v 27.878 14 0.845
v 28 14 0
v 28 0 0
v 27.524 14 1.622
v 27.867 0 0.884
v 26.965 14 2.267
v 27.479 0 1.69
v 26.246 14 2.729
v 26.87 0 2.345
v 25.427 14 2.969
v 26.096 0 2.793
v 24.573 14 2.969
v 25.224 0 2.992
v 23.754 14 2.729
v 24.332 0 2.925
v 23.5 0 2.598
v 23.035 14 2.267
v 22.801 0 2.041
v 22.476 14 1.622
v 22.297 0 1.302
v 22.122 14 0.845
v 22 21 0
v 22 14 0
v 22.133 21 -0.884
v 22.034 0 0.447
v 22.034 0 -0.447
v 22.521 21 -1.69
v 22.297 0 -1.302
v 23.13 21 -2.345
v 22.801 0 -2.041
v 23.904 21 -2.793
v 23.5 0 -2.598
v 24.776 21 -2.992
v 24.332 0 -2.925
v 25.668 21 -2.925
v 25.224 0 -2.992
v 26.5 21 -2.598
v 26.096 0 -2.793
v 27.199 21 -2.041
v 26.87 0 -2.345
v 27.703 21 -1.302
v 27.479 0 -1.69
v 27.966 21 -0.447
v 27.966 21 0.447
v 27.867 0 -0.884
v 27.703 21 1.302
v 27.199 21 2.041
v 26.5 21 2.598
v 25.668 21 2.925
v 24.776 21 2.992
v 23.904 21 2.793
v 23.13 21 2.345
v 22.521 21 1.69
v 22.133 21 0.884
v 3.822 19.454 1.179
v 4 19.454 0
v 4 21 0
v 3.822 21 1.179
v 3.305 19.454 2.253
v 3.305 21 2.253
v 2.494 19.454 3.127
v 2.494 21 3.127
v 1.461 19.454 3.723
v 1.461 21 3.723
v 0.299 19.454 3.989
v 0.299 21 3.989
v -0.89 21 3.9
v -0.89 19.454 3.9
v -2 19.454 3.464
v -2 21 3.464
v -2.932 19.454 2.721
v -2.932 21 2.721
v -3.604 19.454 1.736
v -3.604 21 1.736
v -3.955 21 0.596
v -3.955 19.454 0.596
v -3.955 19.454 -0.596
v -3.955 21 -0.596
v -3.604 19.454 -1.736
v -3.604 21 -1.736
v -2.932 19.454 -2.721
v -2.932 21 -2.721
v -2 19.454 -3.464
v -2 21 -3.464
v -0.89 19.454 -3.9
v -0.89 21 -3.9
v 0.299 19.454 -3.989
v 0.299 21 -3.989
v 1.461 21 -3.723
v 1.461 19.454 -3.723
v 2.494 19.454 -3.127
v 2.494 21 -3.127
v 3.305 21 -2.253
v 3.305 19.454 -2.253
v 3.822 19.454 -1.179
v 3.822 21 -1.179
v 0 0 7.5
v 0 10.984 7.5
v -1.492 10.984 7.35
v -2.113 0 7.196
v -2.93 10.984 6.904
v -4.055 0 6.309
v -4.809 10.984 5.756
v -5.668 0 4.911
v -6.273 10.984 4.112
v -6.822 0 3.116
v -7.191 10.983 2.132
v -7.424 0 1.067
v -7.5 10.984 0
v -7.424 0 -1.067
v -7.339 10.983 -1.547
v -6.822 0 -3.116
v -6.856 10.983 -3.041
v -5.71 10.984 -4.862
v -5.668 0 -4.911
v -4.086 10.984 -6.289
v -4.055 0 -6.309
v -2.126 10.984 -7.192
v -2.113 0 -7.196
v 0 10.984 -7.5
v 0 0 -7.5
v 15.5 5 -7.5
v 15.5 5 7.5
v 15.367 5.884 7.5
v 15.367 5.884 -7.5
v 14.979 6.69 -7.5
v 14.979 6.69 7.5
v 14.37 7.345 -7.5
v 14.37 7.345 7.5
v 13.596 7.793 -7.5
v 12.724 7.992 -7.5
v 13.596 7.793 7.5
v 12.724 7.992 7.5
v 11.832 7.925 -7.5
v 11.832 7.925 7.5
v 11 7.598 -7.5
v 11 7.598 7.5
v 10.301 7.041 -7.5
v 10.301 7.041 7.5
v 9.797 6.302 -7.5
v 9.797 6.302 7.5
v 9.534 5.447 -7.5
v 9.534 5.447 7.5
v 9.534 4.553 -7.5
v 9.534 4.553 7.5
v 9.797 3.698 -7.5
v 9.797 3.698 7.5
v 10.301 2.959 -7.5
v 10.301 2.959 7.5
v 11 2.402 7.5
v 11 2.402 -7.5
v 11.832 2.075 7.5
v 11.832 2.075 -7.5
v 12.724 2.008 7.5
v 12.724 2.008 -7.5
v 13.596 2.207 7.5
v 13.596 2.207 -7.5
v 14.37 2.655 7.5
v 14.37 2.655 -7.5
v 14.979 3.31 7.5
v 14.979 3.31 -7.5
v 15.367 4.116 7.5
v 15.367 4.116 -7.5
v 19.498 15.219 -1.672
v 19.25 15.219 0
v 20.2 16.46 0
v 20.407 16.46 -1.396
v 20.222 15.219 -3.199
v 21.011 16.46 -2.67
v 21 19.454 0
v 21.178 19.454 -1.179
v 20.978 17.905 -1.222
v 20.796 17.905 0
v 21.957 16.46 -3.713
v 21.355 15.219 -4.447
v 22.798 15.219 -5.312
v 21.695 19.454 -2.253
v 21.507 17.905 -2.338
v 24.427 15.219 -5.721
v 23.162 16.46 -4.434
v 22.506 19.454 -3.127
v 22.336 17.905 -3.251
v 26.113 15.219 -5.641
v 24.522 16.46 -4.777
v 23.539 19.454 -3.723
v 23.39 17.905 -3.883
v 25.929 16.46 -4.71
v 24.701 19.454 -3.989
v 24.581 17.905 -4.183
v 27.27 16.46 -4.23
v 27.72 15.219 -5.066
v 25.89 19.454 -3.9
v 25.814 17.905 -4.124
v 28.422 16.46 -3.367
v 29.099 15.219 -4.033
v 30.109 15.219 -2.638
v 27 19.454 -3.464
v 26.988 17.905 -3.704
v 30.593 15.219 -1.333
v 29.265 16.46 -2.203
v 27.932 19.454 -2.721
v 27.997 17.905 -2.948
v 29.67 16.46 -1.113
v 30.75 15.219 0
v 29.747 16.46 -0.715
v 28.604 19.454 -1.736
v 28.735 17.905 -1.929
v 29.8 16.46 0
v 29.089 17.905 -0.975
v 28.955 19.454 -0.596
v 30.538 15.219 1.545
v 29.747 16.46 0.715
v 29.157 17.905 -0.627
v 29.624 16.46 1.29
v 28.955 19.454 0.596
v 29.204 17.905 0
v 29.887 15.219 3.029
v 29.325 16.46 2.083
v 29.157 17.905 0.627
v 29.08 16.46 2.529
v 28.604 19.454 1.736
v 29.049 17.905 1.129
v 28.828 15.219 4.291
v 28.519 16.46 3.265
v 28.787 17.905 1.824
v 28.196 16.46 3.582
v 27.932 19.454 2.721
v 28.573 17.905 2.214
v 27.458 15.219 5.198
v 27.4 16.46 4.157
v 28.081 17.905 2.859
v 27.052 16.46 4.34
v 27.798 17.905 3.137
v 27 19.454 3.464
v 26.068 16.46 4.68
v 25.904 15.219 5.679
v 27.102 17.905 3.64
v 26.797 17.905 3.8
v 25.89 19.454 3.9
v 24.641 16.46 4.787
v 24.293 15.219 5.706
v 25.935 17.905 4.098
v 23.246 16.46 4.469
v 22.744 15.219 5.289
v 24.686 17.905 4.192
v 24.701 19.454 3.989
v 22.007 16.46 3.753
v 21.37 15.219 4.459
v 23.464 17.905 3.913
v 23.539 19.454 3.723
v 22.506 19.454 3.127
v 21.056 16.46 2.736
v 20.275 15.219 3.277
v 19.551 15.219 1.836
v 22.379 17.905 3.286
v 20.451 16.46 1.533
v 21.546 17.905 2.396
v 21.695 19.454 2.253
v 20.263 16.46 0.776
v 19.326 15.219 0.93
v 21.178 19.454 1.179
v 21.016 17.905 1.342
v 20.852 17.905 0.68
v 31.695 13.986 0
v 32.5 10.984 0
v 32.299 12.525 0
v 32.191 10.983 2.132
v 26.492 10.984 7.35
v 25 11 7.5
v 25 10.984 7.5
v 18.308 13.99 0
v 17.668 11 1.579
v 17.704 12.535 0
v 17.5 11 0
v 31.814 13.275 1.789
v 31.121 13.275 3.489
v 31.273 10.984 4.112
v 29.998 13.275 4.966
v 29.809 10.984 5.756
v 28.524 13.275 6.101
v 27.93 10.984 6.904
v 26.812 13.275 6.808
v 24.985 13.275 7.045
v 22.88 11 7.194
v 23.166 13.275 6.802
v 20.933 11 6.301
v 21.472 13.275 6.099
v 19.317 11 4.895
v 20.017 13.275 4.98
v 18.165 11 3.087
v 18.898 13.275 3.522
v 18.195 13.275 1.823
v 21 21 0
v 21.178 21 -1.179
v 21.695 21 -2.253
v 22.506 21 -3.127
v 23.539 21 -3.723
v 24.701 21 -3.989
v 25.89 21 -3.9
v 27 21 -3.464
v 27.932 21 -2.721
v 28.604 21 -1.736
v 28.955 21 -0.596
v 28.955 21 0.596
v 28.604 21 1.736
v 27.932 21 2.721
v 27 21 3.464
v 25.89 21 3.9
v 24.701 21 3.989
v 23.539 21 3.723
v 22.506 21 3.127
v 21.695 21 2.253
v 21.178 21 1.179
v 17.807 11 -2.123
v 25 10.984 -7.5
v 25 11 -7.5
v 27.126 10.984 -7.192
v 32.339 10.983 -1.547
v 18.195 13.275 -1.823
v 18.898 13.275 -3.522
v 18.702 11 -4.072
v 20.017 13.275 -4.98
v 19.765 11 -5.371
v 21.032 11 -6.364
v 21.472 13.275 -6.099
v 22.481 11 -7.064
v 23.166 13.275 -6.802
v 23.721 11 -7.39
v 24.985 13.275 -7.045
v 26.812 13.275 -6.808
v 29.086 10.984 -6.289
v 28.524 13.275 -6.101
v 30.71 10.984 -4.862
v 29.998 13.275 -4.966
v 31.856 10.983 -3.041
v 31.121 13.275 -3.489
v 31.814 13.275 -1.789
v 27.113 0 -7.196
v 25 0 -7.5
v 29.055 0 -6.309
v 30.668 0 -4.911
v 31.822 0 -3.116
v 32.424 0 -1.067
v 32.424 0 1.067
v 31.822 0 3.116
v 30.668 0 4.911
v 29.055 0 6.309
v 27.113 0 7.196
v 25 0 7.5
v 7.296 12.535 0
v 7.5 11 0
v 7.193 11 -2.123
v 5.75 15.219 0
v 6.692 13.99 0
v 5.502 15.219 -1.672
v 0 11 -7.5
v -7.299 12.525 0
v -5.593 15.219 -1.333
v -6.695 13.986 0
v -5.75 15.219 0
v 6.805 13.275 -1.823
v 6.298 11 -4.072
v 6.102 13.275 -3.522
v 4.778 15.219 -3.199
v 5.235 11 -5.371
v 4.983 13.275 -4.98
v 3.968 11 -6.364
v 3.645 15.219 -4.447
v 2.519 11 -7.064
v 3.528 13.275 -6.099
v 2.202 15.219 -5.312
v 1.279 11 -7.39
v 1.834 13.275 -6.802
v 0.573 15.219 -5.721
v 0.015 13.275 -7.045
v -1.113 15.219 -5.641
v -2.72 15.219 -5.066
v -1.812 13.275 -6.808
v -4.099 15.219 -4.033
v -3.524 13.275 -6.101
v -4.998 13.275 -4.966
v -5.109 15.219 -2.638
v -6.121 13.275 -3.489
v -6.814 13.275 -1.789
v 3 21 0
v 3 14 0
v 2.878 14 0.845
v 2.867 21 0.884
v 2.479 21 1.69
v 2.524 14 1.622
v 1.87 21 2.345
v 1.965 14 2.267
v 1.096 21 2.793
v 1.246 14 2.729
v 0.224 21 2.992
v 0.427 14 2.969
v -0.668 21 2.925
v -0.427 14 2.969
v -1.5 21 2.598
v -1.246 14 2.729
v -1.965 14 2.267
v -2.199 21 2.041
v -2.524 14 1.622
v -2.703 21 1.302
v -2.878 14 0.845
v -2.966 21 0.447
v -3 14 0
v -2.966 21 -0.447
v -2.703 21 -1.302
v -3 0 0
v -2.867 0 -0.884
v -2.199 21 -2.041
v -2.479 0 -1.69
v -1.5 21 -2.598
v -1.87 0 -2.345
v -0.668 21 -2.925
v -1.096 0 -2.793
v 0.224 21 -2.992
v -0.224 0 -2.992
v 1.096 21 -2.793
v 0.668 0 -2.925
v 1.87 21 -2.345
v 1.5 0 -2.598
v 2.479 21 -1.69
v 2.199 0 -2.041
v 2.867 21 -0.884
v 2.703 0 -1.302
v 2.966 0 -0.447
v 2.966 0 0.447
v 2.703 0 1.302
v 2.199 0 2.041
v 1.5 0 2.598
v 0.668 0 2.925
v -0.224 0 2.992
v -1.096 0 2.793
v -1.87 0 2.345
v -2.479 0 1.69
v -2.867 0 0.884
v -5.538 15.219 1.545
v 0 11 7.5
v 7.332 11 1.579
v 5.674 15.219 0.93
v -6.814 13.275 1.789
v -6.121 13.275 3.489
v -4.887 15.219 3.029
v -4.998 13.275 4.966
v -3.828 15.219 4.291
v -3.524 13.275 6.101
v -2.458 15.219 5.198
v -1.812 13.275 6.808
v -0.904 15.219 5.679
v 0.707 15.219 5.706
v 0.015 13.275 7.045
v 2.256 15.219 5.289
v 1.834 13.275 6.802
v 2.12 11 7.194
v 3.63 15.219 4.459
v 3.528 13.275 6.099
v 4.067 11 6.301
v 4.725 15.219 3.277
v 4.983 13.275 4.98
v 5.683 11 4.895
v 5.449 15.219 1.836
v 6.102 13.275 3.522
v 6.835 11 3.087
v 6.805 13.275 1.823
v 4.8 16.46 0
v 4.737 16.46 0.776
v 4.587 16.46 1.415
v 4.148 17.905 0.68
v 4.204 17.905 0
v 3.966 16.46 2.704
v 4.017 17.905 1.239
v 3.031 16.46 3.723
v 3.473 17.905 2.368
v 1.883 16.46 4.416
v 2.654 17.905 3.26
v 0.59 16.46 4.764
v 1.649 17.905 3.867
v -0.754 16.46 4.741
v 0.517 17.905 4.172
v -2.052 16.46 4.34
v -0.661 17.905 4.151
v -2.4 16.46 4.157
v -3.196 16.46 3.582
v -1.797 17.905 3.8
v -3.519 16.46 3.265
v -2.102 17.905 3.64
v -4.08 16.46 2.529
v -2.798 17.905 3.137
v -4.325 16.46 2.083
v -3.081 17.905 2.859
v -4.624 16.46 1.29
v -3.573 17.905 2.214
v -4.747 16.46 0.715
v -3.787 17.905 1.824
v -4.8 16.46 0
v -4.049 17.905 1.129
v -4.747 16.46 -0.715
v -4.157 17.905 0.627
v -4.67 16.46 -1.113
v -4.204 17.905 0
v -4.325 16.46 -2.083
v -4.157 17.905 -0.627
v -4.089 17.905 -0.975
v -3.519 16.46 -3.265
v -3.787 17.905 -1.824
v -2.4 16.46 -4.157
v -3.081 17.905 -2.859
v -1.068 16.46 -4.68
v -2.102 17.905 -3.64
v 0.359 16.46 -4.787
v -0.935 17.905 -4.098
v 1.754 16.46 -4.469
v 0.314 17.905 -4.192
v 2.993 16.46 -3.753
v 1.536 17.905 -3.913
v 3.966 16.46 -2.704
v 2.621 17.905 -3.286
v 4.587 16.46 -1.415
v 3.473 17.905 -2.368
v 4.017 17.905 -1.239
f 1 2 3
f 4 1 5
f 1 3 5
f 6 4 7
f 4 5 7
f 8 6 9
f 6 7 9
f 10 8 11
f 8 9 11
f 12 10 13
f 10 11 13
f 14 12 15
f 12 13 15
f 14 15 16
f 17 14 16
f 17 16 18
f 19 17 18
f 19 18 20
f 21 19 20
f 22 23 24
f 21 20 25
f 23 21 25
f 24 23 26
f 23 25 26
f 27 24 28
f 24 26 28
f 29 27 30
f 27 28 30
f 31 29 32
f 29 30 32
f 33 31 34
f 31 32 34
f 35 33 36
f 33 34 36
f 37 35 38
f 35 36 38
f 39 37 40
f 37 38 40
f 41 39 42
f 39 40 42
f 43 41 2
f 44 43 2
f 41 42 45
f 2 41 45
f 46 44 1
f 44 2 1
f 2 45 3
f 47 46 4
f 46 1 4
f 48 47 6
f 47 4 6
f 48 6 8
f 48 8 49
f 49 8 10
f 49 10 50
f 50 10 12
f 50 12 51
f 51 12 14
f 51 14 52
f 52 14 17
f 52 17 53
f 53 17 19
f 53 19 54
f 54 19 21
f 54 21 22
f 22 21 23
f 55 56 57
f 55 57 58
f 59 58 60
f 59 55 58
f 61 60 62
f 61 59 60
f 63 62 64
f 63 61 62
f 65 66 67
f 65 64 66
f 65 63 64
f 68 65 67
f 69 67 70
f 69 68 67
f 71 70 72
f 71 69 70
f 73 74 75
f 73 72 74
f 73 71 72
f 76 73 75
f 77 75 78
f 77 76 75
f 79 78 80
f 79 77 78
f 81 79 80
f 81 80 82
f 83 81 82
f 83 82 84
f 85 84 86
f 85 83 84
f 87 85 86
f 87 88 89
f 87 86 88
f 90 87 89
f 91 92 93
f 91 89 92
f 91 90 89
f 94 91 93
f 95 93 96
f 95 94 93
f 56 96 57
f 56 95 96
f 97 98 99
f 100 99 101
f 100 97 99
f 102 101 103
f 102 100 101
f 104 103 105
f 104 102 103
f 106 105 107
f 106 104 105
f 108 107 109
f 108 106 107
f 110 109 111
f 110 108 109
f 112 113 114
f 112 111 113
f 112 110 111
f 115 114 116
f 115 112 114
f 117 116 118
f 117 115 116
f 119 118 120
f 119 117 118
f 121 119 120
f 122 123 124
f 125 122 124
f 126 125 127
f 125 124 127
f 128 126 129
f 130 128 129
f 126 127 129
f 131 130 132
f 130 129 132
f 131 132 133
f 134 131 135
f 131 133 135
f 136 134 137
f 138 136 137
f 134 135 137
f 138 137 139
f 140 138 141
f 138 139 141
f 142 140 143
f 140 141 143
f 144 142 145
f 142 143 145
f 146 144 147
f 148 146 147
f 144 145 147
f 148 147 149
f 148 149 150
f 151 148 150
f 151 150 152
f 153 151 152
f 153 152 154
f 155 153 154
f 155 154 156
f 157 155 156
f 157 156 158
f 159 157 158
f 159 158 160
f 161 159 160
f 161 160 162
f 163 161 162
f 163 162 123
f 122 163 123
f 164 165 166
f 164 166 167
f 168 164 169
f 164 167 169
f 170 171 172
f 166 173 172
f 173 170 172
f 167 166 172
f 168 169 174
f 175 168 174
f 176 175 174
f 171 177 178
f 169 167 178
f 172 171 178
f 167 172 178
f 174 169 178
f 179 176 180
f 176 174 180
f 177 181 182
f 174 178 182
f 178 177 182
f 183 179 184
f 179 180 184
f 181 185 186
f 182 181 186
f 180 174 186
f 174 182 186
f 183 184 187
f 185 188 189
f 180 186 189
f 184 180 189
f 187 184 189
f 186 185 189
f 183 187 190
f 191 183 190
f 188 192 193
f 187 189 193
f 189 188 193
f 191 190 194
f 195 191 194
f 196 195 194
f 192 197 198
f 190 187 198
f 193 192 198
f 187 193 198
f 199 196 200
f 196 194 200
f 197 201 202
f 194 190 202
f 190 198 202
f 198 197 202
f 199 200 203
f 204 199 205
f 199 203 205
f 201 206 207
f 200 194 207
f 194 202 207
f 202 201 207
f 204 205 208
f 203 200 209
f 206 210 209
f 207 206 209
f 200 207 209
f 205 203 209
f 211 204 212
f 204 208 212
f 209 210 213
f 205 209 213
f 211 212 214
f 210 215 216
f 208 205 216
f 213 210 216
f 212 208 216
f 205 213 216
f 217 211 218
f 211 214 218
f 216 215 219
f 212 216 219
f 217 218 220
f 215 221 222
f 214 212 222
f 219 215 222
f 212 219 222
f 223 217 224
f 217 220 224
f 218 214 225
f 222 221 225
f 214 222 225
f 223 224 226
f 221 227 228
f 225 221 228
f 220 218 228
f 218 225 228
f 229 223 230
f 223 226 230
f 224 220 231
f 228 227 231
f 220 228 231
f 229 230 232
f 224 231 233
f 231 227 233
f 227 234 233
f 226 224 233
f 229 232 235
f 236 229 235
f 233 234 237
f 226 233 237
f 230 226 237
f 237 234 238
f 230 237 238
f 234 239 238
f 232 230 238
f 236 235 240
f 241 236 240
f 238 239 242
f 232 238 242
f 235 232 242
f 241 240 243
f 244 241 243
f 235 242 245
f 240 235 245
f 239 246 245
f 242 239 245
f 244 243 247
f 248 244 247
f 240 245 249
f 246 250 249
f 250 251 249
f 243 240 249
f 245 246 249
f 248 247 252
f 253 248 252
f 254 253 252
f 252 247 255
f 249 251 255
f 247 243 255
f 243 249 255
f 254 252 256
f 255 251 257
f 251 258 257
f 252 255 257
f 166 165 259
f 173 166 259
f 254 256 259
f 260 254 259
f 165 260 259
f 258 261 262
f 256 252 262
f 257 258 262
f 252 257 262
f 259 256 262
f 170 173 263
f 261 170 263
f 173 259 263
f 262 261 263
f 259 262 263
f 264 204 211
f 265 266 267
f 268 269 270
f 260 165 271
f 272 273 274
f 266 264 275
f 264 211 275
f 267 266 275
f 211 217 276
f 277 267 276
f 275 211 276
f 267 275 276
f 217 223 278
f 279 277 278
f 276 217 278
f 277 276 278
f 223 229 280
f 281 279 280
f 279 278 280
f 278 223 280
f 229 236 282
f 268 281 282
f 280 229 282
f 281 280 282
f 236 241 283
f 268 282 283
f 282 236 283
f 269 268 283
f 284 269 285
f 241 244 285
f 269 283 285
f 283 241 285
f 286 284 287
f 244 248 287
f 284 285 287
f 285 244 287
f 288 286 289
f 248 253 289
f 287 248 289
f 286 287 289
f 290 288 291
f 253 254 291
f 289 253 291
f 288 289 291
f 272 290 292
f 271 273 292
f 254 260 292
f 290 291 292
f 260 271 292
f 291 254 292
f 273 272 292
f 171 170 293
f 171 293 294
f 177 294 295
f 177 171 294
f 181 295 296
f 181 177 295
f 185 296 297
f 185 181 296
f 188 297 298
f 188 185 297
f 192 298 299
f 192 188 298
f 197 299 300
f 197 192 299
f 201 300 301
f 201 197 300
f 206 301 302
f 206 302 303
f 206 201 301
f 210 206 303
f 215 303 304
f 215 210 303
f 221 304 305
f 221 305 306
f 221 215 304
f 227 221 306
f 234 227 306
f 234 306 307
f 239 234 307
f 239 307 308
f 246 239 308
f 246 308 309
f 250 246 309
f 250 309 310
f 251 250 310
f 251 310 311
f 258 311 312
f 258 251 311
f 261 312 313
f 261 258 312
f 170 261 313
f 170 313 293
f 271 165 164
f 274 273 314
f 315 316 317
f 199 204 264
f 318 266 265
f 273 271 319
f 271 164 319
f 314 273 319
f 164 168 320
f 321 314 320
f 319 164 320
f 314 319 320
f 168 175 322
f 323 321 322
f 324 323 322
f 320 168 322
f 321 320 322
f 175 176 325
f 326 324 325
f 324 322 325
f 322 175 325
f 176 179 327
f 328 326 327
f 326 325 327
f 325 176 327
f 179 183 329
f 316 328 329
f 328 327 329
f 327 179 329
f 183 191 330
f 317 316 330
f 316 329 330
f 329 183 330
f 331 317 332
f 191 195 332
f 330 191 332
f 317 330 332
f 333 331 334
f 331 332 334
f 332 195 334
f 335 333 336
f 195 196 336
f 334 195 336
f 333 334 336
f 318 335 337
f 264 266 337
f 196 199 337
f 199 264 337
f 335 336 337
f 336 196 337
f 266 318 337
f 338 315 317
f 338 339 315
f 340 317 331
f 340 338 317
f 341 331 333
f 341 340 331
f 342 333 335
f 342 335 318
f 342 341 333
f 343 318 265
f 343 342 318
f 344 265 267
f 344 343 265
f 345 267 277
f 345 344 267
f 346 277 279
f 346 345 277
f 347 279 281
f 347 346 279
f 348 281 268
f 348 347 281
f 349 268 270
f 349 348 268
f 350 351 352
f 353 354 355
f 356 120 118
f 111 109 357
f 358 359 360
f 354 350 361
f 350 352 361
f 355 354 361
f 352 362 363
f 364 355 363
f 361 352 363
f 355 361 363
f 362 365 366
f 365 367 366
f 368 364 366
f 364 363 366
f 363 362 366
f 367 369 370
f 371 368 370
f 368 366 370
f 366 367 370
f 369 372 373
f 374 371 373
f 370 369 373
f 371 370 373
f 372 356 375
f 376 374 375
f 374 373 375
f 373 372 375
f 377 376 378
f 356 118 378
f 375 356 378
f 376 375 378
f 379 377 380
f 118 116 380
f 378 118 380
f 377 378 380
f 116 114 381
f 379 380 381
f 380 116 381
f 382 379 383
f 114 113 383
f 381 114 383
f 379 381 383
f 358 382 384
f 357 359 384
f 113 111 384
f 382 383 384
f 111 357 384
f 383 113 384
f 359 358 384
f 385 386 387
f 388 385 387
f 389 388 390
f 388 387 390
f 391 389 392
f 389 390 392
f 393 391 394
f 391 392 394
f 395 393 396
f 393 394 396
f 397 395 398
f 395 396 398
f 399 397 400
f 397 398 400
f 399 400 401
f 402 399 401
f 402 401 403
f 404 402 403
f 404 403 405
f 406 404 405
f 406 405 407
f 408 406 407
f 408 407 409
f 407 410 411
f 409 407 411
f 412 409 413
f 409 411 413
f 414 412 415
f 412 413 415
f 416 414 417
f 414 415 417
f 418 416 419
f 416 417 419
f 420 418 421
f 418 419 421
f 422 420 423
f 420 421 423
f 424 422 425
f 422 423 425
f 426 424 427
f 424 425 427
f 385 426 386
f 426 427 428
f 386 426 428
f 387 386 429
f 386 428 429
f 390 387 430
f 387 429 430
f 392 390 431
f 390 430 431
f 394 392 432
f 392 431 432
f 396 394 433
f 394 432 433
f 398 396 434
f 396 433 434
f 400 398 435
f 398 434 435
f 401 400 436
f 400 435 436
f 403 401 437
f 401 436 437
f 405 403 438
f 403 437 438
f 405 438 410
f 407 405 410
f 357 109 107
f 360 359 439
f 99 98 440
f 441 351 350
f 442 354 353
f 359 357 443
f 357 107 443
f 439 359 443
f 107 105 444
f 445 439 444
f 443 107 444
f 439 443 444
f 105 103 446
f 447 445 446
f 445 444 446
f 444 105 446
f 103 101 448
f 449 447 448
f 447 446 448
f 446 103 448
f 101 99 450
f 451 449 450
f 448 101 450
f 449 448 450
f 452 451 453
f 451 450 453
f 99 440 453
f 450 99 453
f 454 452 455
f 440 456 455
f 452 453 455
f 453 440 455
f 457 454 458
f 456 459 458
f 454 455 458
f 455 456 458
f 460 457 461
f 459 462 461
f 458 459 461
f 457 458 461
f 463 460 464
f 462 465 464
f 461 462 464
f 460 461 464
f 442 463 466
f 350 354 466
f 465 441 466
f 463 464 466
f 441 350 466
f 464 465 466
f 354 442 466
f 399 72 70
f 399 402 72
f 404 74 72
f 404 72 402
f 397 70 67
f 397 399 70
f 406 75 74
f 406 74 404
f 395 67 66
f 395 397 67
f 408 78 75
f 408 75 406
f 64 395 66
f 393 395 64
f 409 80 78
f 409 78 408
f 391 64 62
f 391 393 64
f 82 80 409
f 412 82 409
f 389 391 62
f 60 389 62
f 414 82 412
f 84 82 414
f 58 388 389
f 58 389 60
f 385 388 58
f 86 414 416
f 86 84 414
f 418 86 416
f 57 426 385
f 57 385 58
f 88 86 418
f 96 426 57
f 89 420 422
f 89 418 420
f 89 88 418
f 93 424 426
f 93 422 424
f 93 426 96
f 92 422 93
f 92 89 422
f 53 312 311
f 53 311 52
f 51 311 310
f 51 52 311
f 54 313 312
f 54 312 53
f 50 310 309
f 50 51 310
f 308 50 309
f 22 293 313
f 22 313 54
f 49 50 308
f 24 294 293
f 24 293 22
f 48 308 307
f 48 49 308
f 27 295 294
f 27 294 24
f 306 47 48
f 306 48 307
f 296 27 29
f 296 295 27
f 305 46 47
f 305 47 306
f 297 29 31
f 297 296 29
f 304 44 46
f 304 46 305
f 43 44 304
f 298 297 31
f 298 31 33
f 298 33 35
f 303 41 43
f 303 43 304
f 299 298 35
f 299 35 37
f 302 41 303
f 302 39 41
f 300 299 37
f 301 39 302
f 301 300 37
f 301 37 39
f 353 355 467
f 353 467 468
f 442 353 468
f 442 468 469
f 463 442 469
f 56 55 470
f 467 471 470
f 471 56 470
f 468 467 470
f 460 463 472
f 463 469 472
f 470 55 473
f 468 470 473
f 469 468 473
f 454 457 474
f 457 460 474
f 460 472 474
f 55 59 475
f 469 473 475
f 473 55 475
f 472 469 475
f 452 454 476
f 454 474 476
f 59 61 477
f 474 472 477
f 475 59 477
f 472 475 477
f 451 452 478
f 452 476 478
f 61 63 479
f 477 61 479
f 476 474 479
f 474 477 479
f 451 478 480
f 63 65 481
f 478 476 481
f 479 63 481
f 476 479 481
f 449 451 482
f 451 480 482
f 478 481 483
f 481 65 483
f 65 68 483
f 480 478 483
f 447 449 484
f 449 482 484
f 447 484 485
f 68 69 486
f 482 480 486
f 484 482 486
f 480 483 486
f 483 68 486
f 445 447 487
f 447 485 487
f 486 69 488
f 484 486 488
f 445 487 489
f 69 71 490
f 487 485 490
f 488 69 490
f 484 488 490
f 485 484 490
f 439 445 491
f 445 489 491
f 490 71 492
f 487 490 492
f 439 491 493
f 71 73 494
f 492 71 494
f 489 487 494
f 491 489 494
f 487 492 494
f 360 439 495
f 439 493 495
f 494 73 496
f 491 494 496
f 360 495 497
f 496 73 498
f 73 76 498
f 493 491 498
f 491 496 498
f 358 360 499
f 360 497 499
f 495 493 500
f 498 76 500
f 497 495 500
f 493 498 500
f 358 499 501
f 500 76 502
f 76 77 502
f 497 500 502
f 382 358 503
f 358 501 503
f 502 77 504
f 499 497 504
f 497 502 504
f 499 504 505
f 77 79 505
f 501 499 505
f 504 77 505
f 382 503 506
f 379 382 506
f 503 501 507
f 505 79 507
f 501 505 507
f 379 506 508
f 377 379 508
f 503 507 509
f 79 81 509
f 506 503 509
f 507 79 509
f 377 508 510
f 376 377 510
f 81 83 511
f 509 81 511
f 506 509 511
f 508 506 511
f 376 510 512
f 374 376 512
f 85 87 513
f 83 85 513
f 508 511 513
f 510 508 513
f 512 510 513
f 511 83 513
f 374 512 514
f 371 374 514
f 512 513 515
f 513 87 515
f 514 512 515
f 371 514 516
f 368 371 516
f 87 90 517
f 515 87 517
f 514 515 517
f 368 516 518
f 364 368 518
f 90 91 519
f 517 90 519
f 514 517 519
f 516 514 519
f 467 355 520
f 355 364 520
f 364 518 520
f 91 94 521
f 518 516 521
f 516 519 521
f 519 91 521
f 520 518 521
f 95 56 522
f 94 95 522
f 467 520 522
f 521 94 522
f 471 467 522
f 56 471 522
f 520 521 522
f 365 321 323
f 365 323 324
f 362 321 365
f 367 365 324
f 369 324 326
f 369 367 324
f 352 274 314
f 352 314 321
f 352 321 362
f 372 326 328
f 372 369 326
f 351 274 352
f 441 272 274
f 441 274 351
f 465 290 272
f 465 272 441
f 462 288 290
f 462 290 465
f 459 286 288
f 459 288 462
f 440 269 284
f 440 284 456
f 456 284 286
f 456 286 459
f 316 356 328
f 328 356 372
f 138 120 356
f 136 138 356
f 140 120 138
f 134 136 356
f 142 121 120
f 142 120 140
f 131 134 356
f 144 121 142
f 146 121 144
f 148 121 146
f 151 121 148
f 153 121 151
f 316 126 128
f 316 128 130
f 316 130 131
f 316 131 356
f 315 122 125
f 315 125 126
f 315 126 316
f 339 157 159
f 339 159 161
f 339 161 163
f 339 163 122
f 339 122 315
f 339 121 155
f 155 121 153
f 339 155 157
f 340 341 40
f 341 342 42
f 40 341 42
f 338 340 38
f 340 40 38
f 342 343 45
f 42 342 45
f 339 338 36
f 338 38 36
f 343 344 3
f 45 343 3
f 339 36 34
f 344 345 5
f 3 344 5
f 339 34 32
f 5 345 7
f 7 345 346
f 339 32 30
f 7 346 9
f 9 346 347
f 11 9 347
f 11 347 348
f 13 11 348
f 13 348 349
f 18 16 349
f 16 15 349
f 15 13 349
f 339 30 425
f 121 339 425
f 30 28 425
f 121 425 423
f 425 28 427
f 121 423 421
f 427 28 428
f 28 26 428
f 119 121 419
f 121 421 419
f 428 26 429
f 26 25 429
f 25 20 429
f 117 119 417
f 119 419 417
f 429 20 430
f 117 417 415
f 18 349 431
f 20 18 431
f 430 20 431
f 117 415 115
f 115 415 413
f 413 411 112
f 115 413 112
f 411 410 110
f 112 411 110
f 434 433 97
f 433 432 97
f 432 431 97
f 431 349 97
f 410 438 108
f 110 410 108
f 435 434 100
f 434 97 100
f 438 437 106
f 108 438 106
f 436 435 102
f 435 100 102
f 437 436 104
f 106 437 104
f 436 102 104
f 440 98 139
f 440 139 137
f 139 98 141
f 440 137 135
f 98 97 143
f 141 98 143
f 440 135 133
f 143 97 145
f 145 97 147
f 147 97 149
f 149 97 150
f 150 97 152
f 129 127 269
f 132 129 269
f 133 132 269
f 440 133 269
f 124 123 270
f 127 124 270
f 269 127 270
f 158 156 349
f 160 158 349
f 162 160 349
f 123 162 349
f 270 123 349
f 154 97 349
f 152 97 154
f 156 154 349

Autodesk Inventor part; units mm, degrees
ref_plane "XZ Plane" through (0, 0, 0) normal (0, 1, 0) x (-1, 0, 0)
ref_plane "XY Plane" through (0, 0, 0) normal (0, 0, 1) x (1, 0, 0)
sketch "Sketch1" plane through (0, 0, 0) normal (0, 1, 0) x (-1, 0, 0)
  circle A0 centre (0, 0) radius 7.5
  circle A1 centre (0, 0) radius 3
  dimension "d0" = 15
  dimension "d1" = 6
extrude "Extrusion1" add sketch "Sketch1" along normal blind 14
sketch "Sketch2" plane through (0, 14, 0) normal (0, 1, 0) x (1, 0, 0)
  circle A0 centre (0, 0) radius 3 projected
  circle A1 centre (0, 0) radius 2.75
  circle A2 centre (0, 0) radius 4
  dimension "d4" = 5.5
  dimension "d5" = 8
extrude "Extrusion2" add sketch "Sketch2" along normal blind 7 contours A2
fillet "Fillet1" radius 6 1 edges at (-4, 14, 0)
fillet "Fillet2" radius 6 2 edges at (0, 14, -7.5) (0, 14, 7.5)
ref_plane "Work Plane1" through (12.5, 0, 0) normal (1, 0, 0) x (0, 1, 0)
mirror "Mirror1" about plane through (12.5, 0, 0) normal (1, 0, 0) of "Extrusion1", "Extrusion2", "Fillet1", "Fillet2"
sketch "Sketch3" plane through (0, 0, 0) normal (0, 1, 0) x (-1, 0, 0)
  circle A0 centre (-25, 0) radius 3 projected
  line L0 (-25, 0) -> (-25, 3)
  line L1 (-25, 0) -> (-25, -3)
  line L2 (0, 0) -> (0, -3)
  circle A1 centre (0, 0) radius 3 projected
  line L3 (0, 0) -> (0, 3)
  line L4 (-25, 3) -> (0, 3)
  line L5 (0, 3) -> (0, 7.5)
  line L6 (0, 7.5) -> (-25, 7.5)
  line L7 (-25, 7.5) -> (-25, 3)
  line L8 (-25, -3) -> (0, -3)
  line L9 (0, -3) -> (0, -7.5)
  line L10 (0, -7.5) -> (-25, -7.5)
  line L11 (-25, -7.5) -> (-25, -3)
  point P0 (0, -3)
  point P1 (0, 3)
  dimension "d11" = 25
  dimension "d12" = 4.5
  dimension "d13" = 25
  dimension "d14" = 4.5
extrude "Extrusion3" add sketch "Sketch3" along normal blind 11 contours A0 L4 A1 L8 | L7 L6 L5 L4 | L8 L9 L10 L11
sketch "Sketch4" plane through (0, 0, 7.5) normal (0, 0, 1) x (1, 0, 0)
  line L0 (25, 11) -> (0, 11) projected
  circle A0 centre (12.5, 5) radius 3
  line L1 (0, 0) -> (25, 0) projected
  line L2 (0, 0) -> (0, 10.9838) projected
  dimension "d18" = 6
  dimension "d21" = 5
  dimension "d22" = 12.5
extrude "Extrusion4" cut sketch "Sketch4" against normal through all
properties part number "4mm_Roller_Spacer_simple"
